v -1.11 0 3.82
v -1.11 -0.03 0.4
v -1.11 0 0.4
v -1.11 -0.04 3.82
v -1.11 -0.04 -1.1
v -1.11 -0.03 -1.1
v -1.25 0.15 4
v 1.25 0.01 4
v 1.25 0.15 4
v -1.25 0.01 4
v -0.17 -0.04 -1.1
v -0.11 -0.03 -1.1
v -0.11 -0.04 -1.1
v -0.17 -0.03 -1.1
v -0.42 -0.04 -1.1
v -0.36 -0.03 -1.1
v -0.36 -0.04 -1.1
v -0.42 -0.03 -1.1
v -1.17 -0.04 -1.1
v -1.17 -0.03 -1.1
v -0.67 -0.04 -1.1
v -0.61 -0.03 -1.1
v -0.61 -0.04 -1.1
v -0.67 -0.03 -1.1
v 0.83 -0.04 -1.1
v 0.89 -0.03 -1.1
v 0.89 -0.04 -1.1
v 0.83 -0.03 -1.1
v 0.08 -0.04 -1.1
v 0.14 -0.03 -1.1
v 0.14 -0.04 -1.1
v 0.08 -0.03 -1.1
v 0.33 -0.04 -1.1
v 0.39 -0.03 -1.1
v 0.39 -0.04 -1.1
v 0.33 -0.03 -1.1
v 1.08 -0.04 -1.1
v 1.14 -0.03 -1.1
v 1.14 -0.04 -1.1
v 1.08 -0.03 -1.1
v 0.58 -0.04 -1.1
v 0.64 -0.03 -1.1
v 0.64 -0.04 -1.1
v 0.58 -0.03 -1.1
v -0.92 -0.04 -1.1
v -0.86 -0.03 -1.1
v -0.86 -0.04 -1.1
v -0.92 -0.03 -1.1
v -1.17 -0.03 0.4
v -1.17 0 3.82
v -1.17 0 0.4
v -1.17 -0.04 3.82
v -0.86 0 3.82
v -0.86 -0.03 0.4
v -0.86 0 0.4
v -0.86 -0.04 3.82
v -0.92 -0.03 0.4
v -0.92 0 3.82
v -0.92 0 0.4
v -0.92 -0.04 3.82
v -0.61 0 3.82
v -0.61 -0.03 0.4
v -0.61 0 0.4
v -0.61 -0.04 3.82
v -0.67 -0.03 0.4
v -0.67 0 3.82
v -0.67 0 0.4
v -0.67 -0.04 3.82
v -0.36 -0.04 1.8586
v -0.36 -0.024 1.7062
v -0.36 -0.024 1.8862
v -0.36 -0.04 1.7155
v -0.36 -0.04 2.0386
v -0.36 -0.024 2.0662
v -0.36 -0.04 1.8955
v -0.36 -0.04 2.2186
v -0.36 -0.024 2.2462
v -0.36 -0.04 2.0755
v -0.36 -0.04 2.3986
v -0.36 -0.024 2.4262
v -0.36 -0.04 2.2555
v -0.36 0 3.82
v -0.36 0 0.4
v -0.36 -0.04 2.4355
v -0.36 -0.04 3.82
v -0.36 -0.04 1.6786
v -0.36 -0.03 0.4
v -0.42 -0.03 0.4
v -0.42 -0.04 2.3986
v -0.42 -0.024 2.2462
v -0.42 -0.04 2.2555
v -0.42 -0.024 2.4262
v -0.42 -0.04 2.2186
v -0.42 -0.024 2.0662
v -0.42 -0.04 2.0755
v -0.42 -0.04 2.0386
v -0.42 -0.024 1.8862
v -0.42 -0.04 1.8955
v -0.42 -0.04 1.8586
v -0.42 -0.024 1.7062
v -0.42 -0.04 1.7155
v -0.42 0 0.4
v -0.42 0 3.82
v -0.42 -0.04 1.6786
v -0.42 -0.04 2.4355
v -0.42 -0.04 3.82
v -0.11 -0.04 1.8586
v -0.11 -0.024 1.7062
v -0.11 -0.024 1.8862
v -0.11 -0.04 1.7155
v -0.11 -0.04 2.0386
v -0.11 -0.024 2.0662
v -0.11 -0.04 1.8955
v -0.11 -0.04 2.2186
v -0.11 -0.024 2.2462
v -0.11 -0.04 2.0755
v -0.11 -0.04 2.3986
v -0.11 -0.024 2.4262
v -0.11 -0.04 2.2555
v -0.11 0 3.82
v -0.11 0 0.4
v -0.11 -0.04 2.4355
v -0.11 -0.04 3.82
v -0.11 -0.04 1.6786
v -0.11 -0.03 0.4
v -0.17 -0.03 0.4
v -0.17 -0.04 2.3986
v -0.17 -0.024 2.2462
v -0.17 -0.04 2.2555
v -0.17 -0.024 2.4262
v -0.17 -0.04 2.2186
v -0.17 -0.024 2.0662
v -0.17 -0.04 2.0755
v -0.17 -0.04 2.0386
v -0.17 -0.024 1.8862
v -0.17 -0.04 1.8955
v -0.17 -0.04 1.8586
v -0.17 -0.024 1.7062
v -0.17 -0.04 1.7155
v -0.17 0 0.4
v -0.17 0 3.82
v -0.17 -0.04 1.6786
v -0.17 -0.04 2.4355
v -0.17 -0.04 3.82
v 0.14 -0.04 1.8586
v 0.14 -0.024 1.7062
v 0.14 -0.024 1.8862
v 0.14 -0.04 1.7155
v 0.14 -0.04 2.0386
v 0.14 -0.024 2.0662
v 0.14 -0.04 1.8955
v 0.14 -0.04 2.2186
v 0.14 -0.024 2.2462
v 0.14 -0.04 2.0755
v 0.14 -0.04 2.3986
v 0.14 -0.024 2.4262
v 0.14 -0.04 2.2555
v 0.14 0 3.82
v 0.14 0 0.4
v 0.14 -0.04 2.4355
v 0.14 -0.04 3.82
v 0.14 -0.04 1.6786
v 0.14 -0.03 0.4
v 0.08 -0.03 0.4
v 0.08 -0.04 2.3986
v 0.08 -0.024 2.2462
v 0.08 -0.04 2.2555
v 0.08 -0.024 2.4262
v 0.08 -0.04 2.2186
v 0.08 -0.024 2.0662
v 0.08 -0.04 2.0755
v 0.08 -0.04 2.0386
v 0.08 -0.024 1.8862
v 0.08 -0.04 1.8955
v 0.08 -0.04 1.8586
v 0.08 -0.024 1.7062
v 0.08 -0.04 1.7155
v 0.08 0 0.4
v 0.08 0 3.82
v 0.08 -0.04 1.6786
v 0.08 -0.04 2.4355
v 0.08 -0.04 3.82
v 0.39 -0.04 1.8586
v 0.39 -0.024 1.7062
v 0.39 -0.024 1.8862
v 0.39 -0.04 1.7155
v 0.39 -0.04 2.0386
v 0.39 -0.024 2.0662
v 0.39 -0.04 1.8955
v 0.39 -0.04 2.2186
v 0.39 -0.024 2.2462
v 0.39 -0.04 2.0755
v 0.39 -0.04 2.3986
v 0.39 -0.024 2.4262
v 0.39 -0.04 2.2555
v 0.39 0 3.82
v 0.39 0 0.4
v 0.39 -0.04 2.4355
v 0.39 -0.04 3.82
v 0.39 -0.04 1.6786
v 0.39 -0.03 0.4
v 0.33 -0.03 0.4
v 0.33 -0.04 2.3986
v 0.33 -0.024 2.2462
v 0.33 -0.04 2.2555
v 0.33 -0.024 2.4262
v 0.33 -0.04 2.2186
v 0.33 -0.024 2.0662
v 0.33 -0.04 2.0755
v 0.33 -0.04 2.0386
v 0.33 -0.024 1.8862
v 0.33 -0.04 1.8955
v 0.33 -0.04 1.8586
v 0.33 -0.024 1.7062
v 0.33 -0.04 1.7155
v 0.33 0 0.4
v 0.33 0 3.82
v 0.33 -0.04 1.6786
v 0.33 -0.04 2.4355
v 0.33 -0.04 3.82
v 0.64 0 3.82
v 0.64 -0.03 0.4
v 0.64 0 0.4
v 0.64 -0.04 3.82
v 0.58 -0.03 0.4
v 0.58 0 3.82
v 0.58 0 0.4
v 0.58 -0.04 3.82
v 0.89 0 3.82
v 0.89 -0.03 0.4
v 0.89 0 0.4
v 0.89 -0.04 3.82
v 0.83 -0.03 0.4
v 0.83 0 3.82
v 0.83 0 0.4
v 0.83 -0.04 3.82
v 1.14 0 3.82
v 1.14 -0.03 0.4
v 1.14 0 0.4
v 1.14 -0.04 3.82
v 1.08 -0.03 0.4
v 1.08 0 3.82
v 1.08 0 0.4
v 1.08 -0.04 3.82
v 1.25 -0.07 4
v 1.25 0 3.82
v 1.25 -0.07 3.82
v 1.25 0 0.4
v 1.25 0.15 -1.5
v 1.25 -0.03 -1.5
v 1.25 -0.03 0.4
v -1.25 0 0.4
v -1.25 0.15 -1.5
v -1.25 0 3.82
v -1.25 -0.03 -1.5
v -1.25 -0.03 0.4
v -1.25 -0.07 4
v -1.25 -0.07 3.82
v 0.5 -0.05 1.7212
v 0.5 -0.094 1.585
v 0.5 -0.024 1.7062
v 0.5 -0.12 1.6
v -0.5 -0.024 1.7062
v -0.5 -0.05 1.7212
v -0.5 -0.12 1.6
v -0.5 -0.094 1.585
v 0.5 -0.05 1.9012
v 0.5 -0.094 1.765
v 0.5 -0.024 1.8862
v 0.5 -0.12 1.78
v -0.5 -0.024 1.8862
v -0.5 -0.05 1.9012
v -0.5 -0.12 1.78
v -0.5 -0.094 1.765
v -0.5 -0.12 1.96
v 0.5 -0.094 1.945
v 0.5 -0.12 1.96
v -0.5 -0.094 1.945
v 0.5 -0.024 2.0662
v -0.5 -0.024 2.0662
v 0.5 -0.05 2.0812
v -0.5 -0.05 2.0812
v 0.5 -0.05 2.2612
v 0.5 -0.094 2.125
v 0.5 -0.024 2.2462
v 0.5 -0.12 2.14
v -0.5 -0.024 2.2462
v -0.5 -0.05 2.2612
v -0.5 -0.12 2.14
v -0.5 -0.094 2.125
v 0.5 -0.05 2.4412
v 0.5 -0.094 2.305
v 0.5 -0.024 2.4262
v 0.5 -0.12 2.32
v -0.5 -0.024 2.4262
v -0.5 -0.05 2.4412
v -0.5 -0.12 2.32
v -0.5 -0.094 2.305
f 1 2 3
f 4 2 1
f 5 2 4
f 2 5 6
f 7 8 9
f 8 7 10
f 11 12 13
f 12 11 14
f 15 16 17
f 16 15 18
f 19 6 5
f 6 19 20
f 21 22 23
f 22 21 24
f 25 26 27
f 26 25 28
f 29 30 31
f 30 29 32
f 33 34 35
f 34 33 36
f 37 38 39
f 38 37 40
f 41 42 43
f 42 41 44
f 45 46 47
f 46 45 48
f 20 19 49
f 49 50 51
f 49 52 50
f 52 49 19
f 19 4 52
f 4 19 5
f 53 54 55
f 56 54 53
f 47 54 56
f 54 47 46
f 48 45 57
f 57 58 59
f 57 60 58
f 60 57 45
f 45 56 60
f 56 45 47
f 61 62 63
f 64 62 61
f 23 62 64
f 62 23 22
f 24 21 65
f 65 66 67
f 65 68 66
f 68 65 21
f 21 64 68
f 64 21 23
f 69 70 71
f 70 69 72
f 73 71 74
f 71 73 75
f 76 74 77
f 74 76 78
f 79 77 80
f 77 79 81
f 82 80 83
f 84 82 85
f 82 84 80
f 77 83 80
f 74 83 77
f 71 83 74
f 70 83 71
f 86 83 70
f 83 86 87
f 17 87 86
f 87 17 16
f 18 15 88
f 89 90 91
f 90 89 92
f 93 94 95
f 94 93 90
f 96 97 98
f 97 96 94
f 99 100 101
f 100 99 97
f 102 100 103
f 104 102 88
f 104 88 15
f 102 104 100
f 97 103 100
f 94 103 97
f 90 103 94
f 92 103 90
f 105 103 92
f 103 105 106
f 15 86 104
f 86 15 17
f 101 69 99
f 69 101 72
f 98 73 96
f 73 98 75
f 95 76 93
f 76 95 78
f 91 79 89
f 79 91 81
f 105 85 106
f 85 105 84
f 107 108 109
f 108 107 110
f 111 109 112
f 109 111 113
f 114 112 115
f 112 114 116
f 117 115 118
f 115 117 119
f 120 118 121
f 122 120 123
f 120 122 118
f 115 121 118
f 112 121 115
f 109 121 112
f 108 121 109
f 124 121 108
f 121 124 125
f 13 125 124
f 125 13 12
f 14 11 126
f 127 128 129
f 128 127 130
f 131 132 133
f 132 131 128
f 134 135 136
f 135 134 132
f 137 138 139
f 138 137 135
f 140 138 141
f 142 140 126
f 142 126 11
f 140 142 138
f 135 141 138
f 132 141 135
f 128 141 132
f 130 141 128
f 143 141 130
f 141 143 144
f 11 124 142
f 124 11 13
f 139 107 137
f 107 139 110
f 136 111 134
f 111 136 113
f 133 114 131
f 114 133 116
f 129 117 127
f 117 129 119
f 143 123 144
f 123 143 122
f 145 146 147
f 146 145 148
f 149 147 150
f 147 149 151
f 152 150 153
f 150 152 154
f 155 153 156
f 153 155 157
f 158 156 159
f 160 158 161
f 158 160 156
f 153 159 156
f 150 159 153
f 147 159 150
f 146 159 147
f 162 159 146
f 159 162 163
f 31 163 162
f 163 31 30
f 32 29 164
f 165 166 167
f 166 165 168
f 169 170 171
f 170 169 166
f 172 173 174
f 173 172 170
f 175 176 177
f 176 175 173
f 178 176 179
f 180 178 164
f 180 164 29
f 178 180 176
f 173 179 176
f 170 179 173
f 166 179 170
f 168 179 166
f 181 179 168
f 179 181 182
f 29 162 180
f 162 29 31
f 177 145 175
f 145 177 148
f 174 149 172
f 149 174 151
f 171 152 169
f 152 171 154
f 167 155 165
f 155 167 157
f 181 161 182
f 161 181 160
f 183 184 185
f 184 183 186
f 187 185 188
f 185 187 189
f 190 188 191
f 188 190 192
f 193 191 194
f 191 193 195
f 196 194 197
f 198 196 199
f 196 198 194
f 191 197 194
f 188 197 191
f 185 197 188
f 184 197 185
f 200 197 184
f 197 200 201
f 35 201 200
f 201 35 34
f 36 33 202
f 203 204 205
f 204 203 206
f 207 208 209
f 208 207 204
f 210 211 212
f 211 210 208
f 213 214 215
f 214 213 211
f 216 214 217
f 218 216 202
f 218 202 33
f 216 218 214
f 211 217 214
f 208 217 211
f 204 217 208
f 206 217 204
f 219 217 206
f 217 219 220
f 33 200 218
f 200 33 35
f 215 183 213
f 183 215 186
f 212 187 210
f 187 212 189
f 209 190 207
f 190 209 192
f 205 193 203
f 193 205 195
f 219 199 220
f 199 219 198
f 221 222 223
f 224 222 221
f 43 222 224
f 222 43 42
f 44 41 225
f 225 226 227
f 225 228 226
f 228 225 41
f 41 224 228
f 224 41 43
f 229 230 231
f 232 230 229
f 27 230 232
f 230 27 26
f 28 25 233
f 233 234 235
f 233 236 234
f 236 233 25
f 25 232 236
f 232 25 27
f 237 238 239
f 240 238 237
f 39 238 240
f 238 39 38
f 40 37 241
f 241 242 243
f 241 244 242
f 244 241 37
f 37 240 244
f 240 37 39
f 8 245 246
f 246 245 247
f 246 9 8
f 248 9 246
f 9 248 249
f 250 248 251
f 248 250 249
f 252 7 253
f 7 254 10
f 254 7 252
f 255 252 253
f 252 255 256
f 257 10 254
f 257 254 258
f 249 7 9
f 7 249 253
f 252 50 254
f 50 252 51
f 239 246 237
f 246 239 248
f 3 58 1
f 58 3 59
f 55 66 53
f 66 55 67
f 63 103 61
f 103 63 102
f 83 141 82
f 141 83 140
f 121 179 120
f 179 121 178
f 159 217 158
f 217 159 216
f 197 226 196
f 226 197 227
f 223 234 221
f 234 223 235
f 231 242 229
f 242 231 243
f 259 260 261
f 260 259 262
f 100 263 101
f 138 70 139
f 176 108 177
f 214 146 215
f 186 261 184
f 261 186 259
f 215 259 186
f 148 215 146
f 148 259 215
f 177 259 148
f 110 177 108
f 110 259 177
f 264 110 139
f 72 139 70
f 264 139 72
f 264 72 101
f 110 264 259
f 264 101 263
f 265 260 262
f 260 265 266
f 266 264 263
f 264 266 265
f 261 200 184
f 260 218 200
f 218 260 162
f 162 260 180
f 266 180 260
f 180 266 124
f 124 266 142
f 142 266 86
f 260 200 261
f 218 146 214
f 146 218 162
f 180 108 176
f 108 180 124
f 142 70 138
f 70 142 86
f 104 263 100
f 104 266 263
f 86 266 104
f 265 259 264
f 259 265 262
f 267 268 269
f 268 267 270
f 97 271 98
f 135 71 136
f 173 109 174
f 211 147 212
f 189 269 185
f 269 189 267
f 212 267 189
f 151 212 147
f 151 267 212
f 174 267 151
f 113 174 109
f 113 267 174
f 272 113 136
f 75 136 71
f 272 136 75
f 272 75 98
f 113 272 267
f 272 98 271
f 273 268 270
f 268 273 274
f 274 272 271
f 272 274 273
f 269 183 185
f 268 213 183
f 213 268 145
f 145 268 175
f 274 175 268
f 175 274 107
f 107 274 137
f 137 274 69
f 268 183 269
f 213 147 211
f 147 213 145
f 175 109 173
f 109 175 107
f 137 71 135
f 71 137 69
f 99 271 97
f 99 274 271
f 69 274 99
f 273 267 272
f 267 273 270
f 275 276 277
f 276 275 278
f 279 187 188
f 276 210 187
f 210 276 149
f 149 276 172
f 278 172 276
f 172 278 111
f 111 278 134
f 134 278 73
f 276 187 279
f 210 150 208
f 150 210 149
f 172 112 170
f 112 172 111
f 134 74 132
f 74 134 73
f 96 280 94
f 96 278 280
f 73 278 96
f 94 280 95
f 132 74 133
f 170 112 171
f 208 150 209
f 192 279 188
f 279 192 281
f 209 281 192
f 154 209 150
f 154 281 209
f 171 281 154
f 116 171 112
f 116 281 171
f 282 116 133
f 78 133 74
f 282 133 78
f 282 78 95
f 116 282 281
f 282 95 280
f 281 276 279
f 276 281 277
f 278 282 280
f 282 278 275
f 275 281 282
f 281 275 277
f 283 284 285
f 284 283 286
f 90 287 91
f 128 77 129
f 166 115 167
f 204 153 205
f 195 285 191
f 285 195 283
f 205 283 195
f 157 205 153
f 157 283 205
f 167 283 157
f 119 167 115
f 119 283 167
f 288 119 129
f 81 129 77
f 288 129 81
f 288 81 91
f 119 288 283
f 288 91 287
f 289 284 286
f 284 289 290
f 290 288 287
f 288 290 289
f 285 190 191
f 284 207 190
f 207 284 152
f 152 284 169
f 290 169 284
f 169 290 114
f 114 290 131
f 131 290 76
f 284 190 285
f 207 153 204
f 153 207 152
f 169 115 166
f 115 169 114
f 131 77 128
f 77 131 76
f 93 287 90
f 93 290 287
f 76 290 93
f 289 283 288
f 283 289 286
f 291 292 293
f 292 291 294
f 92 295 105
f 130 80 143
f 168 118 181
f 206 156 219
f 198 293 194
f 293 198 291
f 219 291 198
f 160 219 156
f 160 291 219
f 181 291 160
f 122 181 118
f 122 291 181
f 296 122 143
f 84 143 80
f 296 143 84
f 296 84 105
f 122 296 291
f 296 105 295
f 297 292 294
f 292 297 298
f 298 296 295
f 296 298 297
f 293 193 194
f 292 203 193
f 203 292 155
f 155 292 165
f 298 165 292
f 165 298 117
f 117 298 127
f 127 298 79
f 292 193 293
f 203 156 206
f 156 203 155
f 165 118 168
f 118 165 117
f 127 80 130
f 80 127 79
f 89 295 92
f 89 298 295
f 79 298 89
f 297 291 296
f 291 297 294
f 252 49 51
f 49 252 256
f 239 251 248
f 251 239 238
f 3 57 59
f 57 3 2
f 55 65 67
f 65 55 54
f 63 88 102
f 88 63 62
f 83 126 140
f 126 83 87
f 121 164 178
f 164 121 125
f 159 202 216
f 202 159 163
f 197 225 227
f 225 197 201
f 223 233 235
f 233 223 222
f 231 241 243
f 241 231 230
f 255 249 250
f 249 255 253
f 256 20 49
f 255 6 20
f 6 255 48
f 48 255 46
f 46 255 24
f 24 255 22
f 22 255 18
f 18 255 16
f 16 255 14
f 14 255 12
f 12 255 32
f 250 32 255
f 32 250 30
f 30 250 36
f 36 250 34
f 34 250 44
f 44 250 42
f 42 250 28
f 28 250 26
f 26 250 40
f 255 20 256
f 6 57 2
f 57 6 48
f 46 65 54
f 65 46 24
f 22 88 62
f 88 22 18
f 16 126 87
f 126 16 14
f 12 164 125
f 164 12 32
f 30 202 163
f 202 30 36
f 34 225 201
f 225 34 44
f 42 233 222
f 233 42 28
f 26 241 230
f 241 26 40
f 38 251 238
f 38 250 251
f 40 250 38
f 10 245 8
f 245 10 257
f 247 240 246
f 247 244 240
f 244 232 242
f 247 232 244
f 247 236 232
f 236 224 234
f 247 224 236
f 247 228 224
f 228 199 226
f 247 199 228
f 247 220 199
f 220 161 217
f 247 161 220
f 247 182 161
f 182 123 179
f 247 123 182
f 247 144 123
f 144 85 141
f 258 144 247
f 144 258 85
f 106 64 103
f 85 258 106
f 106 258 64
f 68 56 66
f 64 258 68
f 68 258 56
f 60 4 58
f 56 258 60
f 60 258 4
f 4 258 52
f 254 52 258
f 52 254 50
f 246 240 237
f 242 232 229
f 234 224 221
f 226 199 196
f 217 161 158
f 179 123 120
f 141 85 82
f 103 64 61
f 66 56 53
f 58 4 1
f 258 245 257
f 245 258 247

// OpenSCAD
// Shed shell kit: wall window alt. See lib/lodge_kit.scad.
include <lib/lodge_kit.scad>
kind = "shed";
wall_window_alt();
